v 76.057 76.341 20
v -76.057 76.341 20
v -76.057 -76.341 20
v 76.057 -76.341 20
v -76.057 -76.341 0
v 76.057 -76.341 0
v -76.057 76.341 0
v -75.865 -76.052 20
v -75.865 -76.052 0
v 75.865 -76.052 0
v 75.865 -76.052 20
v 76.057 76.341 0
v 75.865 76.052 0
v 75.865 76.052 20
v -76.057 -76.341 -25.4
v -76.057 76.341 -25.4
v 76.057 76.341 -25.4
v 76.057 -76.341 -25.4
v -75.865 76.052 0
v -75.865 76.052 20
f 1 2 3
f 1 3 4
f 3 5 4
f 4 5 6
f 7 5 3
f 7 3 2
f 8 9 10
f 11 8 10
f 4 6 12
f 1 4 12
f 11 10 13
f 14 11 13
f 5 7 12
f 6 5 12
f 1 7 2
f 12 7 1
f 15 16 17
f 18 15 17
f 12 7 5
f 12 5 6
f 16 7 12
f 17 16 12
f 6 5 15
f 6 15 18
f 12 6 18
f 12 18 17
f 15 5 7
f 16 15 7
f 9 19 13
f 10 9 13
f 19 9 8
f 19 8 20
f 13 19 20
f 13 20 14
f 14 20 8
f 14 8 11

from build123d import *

# Parameters (mm, degrees)
F1_W     = 152.1134674549
F1_H     = 152.6828706264
F2_DEPTH = 20
F0_W     = 151.7293900251
F0_H     = 152.1038264036
F3_DEPTH = 25.4


with BuildPart() as f2:
    # F1 (on face) → F2 (new body)
    with BuildSketch(Plane.XY):
        Rectangle(F1_W, F1_H)
    extrude(amount=F2_DEPTH)


with BuildPart() as f2b:
    # F0 (on Top) → F2, piece 2 (new body)
    with BuildSketch(Plane.XY):
        Rectangle(F0_W, F0_H)
    extrude(amount=F2_DEPTH)


with BuildPart() as f3:
    # F3 (new): a face of the model
    f3_faces = [f2.part.faces().sort_by_distance(p)[0] for p in [
        (0, 0, 0),
    ]]
    extrude(f3_faces, amount=F3_DEPTH)


solid = Compound([f2.part, f2b.part, f3.part])
